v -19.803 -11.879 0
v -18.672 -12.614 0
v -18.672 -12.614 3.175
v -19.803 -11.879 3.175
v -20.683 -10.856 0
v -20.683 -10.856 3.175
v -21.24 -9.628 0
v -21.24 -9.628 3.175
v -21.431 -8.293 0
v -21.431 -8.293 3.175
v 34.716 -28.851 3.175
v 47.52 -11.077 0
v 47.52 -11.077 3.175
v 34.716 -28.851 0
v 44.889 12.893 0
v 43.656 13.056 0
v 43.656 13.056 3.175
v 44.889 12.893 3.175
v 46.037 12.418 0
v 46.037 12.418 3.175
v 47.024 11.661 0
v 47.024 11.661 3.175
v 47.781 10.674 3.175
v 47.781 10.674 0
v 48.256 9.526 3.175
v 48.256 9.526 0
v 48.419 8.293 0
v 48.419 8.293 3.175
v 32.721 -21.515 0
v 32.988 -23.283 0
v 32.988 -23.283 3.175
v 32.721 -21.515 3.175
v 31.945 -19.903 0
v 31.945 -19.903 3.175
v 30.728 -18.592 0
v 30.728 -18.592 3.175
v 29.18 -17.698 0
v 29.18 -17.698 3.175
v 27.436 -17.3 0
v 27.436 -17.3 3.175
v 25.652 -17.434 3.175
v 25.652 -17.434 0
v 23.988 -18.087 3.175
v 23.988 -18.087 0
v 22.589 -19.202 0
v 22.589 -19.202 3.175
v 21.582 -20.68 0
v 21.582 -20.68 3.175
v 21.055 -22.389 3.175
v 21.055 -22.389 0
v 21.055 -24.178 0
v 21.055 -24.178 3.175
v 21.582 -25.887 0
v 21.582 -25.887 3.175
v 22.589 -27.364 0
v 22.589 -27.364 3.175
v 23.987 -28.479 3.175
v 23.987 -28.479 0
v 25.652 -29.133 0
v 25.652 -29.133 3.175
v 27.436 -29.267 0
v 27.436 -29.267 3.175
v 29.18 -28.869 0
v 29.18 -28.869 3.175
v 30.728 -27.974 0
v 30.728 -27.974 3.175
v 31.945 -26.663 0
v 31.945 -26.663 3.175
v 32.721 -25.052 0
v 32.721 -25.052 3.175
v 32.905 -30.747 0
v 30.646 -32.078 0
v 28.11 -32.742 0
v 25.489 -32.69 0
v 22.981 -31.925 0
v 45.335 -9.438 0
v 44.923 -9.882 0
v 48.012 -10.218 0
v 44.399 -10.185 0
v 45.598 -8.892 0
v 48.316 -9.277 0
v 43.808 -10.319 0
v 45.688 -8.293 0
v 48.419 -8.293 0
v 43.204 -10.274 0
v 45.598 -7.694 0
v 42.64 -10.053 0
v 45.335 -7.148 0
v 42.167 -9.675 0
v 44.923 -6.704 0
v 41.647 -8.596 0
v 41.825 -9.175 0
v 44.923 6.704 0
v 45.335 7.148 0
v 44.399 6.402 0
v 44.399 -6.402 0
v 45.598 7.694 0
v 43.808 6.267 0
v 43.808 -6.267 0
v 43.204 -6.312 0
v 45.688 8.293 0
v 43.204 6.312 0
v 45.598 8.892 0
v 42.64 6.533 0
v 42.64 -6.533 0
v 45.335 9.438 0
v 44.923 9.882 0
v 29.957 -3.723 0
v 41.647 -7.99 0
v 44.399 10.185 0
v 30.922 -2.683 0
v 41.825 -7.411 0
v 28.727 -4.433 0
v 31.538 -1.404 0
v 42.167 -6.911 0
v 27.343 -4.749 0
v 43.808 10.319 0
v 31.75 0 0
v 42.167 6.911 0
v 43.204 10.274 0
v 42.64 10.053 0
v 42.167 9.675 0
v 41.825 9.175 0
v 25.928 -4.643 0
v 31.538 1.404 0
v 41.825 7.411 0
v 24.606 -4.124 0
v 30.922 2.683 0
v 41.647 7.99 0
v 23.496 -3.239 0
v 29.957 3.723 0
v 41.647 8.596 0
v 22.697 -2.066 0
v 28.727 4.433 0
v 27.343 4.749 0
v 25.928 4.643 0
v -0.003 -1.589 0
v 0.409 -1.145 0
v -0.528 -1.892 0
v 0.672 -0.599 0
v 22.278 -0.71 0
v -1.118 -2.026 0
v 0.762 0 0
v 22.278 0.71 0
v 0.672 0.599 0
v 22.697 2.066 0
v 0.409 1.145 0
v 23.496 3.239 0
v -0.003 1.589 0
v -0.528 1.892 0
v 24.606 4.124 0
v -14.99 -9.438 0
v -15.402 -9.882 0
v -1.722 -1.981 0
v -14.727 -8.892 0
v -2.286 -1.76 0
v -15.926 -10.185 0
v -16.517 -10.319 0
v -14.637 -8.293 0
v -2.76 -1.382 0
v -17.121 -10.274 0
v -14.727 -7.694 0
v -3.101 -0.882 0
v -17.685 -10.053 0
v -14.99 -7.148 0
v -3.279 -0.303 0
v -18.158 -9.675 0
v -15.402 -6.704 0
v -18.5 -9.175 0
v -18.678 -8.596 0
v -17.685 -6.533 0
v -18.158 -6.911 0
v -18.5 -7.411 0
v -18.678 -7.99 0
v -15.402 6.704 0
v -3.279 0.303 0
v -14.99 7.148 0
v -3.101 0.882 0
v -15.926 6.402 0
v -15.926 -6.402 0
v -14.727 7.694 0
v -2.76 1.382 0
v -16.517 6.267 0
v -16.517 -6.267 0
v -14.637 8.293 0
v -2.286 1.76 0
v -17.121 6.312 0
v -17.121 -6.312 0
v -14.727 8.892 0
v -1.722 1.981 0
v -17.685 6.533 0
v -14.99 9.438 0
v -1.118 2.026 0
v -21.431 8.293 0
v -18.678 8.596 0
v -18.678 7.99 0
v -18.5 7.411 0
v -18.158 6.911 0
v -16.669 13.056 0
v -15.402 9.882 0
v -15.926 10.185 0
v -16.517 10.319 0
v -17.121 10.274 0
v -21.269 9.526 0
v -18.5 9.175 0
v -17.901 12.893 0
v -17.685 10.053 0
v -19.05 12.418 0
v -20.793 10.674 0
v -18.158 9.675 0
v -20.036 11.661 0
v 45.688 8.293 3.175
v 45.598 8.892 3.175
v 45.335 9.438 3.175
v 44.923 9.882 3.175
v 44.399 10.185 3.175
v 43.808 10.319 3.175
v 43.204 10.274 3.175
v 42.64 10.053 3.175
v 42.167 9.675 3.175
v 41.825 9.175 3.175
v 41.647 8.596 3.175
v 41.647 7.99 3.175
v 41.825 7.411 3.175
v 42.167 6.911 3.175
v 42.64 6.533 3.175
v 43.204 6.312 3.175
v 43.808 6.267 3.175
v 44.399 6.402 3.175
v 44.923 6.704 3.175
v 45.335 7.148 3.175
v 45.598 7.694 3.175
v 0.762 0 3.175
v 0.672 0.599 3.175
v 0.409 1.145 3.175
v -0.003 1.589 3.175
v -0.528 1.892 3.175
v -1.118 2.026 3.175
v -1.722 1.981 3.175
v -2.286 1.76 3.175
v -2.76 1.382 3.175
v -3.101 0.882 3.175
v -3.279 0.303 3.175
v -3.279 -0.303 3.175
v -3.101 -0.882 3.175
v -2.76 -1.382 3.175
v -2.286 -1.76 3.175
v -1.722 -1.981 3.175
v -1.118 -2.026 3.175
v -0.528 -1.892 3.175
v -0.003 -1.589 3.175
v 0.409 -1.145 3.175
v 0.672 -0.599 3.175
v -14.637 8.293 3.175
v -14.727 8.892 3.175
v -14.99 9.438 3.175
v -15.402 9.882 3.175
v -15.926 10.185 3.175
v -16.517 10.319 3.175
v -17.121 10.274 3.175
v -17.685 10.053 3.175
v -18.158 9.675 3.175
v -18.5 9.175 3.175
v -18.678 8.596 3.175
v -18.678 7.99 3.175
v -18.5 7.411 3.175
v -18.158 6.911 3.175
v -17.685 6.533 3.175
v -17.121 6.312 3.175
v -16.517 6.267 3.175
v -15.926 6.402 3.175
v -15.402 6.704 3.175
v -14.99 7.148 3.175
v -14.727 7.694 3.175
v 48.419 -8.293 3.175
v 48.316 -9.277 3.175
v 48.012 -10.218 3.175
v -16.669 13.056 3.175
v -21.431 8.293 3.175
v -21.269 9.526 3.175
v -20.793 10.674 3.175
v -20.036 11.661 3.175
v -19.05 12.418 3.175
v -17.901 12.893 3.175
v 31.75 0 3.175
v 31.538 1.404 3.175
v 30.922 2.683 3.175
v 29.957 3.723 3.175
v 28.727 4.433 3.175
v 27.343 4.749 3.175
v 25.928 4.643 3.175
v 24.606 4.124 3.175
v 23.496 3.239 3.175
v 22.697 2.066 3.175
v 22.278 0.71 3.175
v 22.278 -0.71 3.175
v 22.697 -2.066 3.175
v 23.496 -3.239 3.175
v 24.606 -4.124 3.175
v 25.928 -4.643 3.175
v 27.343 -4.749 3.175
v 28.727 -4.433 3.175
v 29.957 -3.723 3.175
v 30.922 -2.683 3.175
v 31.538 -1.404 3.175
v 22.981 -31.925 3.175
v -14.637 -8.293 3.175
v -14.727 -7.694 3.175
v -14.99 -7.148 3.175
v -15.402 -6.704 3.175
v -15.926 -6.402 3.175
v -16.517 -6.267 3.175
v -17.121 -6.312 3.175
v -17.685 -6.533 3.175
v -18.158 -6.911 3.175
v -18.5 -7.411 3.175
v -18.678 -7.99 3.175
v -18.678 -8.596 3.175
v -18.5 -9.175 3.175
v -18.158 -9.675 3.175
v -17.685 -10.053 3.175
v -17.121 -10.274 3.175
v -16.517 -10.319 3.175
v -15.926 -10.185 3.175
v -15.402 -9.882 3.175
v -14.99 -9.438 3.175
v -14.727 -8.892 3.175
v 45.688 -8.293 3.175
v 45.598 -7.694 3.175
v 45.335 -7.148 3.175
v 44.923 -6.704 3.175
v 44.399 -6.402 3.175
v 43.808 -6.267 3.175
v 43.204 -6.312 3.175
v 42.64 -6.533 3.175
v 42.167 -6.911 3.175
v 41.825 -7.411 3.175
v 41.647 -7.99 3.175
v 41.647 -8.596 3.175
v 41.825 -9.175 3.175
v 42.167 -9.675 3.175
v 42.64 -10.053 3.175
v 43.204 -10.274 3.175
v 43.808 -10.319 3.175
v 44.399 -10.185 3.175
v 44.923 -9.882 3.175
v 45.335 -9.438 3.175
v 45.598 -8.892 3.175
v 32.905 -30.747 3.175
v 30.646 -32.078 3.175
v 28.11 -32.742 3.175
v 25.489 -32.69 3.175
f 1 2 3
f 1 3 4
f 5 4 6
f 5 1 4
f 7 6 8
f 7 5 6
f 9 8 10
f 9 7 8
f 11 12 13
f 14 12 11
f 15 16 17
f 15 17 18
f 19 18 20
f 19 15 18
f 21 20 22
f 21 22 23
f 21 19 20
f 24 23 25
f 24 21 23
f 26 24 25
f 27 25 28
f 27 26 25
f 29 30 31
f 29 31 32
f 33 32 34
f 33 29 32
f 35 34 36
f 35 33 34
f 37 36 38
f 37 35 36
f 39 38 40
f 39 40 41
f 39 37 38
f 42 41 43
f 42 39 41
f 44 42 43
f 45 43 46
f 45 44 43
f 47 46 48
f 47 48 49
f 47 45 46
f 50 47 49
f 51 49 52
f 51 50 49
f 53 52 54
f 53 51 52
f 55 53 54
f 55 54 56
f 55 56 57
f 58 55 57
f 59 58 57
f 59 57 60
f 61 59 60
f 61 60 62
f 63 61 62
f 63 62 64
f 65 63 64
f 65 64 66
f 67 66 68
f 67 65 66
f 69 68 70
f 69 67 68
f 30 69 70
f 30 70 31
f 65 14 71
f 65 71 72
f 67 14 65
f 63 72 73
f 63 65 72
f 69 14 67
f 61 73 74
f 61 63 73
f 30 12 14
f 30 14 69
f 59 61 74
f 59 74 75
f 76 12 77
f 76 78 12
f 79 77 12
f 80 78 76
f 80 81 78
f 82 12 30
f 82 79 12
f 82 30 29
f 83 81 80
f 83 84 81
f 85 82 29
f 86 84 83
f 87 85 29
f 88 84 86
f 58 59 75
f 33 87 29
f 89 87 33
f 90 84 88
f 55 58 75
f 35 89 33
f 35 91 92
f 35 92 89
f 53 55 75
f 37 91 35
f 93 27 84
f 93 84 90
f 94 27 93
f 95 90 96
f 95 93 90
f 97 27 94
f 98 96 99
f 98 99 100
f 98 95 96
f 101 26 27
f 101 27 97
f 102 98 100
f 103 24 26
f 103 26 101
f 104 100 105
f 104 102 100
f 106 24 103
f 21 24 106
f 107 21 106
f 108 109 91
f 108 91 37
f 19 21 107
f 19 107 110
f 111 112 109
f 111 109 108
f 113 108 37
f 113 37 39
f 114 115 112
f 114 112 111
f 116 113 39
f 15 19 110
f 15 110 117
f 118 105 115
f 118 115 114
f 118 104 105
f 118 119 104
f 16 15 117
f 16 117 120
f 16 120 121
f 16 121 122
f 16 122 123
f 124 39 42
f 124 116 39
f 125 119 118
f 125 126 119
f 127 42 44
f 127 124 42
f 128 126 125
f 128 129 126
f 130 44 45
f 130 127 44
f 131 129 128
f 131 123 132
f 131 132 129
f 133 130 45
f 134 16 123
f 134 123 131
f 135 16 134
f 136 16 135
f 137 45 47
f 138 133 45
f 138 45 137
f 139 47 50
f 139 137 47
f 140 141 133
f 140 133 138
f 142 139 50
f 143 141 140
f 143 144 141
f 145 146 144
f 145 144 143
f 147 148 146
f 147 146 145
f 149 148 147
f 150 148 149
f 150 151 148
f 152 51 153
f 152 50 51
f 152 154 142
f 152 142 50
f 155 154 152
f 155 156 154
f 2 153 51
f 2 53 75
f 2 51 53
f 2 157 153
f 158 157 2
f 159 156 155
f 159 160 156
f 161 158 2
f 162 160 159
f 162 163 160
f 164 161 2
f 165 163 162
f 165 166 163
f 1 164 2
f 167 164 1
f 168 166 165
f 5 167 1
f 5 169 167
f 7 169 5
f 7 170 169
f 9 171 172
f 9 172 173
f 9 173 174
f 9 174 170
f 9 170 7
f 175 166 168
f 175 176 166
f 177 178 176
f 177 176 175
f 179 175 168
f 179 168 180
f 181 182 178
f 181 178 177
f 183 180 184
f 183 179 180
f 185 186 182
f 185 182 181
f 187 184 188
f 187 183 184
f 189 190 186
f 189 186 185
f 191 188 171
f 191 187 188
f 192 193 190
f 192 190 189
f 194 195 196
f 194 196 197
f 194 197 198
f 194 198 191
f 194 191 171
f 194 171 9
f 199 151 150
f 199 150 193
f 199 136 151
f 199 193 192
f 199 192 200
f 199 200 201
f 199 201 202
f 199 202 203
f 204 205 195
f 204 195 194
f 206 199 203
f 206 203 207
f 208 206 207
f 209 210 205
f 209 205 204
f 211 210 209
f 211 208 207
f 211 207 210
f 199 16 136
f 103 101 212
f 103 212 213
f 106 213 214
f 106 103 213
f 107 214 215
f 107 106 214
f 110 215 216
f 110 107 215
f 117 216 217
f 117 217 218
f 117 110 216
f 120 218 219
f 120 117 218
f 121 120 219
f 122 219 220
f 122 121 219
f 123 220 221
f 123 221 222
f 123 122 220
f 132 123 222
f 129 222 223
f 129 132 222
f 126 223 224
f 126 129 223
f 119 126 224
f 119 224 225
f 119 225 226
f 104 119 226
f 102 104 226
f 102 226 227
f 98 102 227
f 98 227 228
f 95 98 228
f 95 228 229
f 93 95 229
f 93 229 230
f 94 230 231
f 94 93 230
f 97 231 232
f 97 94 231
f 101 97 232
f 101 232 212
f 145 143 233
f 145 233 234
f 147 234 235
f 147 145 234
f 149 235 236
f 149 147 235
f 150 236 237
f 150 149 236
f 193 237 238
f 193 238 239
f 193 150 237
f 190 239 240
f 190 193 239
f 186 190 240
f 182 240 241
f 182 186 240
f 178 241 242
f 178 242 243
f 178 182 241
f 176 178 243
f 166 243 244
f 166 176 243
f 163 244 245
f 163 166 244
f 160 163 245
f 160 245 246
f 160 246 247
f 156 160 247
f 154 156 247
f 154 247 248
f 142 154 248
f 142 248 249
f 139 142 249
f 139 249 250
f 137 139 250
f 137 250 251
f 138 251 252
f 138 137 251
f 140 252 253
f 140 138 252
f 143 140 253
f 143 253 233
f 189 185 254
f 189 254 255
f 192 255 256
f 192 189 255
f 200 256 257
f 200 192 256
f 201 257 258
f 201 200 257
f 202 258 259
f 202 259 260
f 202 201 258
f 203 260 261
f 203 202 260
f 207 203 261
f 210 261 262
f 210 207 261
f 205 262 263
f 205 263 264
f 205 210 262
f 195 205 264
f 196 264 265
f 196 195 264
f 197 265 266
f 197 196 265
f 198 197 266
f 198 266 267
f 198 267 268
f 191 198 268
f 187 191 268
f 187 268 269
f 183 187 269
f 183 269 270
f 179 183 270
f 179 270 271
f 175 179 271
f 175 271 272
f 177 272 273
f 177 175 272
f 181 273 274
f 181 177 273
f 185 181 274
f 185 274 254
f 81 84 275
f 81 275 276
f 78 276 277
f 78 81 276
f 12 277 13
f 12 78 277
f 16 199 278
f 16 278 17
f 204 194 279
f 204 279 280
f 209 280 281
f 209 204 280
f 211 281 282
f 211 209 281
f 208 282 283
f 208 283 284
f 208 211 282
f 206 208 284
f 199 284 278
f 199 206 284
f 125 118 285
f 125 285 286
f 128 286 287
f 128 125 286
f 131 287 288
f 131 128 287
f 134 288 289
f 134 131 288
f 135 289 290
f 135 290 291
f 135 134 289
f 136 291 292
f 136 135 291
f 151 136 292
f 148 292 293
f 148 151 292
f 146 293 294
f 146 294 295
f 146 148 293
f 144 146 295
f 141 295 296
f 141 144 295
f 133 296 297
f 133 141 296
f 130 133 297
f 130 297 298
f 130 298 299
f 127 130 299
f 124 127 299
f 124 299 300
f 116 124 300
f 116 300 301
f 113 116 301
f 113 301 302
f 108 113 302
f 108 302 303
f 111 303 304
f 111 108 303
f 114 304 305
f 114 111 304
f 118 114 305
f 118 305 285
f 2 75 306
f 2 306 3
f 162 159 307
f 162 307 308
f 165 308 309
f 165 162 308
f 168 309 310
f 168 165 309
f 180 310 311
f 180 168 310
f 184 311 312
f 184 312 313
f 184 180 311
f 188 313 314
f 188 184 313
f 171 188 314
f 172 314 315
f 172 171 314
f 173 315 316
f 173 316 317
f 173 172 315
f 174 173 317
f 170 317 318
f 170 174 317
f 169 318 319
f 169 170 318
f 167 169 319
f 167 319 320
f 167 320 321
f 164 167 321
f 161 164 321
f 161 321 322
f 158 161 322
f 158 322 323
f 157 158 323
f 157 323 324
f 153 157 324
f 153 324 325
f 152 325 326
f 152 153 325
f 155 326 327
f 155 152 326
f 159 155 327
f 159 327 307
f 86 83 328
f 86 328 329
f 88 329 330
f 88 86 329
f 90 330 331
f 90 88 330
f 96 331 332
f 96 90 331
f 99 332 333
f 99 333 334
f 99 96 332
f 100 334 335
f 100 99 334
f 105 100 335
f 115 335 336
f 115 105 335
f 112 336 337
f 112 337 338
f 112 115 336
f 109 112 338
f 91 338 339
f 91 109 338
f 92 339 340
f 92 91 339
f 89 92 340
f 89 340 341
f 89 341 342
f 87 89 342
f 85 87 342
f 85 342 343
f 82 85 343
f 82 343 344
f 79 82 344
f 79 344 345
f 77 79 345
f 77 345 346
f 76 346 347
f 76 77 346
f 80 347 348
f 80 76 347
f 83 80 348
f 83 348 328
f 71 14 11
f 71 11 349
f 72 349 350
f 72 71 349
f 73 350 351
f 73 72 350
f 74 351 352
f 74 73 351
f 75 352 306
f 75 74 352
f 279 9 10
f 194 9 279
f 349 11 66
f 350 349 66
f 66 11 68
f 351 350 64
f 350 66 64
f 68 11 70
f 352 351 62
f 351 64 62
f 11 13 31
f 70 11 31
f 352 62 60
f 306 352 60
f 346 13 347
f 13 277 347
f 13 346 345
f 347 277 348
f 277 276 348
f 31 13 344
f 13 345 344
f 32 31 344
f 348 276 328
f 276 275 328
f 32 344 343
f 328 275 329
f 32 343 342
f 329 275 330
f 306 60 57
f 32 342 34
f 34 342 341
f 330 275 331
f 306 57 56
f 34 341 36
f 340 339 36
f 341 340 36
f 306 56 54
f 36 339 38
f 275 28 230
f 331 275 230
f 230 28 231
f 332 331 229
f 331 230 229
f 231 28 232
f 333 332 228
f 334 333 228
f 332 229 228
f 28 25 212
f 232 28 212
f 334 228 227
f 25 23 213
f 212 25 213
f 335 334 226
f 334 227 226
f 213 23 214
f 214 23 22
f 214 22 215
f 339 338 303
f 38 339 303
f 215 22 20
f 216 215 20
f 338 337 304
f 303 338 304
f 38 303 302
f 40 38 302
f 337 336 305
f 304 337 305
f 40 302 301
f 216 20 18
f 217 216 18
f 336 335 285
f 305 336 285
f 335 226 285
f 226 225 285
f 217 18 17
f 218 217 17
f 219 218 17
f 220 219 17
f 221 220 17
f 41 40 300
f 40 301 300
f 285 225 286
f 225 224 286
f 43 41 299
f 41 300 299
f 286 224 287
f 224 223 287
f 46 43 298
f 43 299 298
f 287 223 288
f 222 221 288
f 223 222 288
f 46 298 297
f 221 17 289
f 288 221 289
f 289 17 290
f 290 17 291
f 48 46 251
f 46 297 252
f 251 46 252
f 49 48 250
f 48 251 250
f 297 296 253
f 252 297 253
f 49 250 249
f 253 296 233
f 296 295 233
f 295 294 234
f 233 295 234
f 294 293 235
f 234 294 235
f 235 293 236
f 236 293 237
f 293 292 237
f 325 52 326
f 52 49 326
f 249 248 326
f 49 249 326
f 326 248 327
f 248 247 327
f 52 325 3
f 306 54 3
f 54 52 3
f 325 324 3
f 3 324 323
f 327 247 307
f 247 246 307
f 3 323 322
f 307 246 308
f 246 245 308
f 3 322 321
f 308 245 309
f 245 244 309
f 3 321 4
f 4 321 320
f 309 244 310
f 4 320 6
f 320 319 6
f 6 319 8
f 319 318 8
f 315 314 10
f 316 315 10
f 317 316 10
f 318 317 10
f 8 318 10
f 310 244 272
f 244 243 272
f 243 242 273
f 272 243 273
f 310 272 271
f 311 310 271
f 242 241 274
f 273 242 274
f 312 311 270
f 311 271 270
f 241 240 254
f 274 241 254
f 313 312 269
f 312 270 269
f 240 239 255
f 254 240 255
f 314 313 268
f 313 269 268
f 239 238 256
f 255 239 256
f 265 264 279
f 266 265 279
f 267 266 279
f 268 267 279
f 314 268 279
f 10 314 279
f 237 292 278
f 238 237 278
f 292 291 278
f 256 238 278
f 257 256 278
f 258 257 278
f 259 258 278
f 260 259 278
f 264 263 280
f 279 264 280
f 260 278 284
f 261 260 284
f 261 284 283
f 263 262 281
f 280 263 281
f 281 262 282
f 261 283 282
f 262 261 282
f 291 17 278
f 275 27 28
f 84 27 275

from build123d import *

# Parameters (mm, degrees)
SKETCH1_R           = 4.7625
SKETCH1_R_2         = 2.032
BOSS_EXTRUDE1_DEPTH = 3.175
BOSS_EXTRUDE2_START = -3.175
SKETCH2_R           = 6
BOSS_EXTRUDE2_DEPTH = 3.175


with BuildPart() as part:
    # Sketch1 → Boss-Extrude1 (new body)
    with BuildSketch(Plane.XY):
        with BuildLine():
            Line((43.65625, -13.0556), (-16.66875, -13.0556))
            ThreePointArc((-16.66875, -13.0556), (-20.036346045, -11.660696045), (-21.43125, -8.2931))
            Line((-21.43125, -8.2931), (-21.43125, 8.2931))
            ThreePointArc((-21.43125, 8.2931), (-20.036346045, 11.660696045), (-16.66875, 13.0556))
            Line((-16.66875, 13.0556), (43.65625, 13.0556))
            ThreePointArc((43.65625, 13.0556), (47.023846045, 11.660696045), (48.41875, 8.2931))
            Line((48.41875, 8.2931), (48.41875, -8.2931))
            ThreePointArc((48.41875, -8.2931), (47.023846045, -11.660696045), (43.65625, -13.0556))
        make_face()
        with Locations((26.9875, 0)):
            Circle(SKETCH1_R, mode=Mode.SUBTRACT)
        with Locations((-16.66875, 8.2931)):
            Circle(SKETCH1_R_2, mode=Mode.SUBTRACT)
        with Locations((43.65625, 8.2931)):
            Circle(SKETCH1_R_2, mode=Mode.SUBTRACT)
        with Locations((-16.66875, -8.2931)):
            Circle(SKETCH1_R_2, mode=Mode.SUBTRACT)
        with Locations((43.65625, -8.2931)):
            Circle(SKETCH1_R_2, mode=Mode.SUBTRACT)
        with Locations((-1.27, 0)):
            Circle(SKETCH1_R_2, mode=Mode.SUBTRACT)
    extrude(amount=BOSS_EXTRUDE1_DEPTH)

    # Sketch2 → Boss-Extrude2 (add)
    with BuildSketch(Plane.XY.offset(3.175).offset(BOSS_EXTRUDE2_START)):
        with BuildLine():
            Line((22.98118695, -31.924816254), (-18.671906525, -12.613837227))
            ThreePointArc((-18.671906525, -12.613837227), (-17.694394969, -12.943848181), (-16.66875, -13.0556))
            Line((-16.66875, -13.0556), (43.65625, -13.0556))
            ThreePointArc((43.65625, -13.0556), (45.826918249, -12.53215716), (47.520433425, -11.076891067))
            Line((47.520433425, -11.076891067), (34.71586685, -28.850923935))
            ThreePointArc((34.71586685, -28.850923935), (29.401133075, -32.49746142), (22.98118695, -31.924816254))
        make_face()
        with Locations((26.9875, -23.2833418)):
            Circle(SKETCH2_R, mode=Mode.SUBTRACT)
    extrude(amount=BOSS_EXTRUDE2_DEPTH)


solid = part.part
